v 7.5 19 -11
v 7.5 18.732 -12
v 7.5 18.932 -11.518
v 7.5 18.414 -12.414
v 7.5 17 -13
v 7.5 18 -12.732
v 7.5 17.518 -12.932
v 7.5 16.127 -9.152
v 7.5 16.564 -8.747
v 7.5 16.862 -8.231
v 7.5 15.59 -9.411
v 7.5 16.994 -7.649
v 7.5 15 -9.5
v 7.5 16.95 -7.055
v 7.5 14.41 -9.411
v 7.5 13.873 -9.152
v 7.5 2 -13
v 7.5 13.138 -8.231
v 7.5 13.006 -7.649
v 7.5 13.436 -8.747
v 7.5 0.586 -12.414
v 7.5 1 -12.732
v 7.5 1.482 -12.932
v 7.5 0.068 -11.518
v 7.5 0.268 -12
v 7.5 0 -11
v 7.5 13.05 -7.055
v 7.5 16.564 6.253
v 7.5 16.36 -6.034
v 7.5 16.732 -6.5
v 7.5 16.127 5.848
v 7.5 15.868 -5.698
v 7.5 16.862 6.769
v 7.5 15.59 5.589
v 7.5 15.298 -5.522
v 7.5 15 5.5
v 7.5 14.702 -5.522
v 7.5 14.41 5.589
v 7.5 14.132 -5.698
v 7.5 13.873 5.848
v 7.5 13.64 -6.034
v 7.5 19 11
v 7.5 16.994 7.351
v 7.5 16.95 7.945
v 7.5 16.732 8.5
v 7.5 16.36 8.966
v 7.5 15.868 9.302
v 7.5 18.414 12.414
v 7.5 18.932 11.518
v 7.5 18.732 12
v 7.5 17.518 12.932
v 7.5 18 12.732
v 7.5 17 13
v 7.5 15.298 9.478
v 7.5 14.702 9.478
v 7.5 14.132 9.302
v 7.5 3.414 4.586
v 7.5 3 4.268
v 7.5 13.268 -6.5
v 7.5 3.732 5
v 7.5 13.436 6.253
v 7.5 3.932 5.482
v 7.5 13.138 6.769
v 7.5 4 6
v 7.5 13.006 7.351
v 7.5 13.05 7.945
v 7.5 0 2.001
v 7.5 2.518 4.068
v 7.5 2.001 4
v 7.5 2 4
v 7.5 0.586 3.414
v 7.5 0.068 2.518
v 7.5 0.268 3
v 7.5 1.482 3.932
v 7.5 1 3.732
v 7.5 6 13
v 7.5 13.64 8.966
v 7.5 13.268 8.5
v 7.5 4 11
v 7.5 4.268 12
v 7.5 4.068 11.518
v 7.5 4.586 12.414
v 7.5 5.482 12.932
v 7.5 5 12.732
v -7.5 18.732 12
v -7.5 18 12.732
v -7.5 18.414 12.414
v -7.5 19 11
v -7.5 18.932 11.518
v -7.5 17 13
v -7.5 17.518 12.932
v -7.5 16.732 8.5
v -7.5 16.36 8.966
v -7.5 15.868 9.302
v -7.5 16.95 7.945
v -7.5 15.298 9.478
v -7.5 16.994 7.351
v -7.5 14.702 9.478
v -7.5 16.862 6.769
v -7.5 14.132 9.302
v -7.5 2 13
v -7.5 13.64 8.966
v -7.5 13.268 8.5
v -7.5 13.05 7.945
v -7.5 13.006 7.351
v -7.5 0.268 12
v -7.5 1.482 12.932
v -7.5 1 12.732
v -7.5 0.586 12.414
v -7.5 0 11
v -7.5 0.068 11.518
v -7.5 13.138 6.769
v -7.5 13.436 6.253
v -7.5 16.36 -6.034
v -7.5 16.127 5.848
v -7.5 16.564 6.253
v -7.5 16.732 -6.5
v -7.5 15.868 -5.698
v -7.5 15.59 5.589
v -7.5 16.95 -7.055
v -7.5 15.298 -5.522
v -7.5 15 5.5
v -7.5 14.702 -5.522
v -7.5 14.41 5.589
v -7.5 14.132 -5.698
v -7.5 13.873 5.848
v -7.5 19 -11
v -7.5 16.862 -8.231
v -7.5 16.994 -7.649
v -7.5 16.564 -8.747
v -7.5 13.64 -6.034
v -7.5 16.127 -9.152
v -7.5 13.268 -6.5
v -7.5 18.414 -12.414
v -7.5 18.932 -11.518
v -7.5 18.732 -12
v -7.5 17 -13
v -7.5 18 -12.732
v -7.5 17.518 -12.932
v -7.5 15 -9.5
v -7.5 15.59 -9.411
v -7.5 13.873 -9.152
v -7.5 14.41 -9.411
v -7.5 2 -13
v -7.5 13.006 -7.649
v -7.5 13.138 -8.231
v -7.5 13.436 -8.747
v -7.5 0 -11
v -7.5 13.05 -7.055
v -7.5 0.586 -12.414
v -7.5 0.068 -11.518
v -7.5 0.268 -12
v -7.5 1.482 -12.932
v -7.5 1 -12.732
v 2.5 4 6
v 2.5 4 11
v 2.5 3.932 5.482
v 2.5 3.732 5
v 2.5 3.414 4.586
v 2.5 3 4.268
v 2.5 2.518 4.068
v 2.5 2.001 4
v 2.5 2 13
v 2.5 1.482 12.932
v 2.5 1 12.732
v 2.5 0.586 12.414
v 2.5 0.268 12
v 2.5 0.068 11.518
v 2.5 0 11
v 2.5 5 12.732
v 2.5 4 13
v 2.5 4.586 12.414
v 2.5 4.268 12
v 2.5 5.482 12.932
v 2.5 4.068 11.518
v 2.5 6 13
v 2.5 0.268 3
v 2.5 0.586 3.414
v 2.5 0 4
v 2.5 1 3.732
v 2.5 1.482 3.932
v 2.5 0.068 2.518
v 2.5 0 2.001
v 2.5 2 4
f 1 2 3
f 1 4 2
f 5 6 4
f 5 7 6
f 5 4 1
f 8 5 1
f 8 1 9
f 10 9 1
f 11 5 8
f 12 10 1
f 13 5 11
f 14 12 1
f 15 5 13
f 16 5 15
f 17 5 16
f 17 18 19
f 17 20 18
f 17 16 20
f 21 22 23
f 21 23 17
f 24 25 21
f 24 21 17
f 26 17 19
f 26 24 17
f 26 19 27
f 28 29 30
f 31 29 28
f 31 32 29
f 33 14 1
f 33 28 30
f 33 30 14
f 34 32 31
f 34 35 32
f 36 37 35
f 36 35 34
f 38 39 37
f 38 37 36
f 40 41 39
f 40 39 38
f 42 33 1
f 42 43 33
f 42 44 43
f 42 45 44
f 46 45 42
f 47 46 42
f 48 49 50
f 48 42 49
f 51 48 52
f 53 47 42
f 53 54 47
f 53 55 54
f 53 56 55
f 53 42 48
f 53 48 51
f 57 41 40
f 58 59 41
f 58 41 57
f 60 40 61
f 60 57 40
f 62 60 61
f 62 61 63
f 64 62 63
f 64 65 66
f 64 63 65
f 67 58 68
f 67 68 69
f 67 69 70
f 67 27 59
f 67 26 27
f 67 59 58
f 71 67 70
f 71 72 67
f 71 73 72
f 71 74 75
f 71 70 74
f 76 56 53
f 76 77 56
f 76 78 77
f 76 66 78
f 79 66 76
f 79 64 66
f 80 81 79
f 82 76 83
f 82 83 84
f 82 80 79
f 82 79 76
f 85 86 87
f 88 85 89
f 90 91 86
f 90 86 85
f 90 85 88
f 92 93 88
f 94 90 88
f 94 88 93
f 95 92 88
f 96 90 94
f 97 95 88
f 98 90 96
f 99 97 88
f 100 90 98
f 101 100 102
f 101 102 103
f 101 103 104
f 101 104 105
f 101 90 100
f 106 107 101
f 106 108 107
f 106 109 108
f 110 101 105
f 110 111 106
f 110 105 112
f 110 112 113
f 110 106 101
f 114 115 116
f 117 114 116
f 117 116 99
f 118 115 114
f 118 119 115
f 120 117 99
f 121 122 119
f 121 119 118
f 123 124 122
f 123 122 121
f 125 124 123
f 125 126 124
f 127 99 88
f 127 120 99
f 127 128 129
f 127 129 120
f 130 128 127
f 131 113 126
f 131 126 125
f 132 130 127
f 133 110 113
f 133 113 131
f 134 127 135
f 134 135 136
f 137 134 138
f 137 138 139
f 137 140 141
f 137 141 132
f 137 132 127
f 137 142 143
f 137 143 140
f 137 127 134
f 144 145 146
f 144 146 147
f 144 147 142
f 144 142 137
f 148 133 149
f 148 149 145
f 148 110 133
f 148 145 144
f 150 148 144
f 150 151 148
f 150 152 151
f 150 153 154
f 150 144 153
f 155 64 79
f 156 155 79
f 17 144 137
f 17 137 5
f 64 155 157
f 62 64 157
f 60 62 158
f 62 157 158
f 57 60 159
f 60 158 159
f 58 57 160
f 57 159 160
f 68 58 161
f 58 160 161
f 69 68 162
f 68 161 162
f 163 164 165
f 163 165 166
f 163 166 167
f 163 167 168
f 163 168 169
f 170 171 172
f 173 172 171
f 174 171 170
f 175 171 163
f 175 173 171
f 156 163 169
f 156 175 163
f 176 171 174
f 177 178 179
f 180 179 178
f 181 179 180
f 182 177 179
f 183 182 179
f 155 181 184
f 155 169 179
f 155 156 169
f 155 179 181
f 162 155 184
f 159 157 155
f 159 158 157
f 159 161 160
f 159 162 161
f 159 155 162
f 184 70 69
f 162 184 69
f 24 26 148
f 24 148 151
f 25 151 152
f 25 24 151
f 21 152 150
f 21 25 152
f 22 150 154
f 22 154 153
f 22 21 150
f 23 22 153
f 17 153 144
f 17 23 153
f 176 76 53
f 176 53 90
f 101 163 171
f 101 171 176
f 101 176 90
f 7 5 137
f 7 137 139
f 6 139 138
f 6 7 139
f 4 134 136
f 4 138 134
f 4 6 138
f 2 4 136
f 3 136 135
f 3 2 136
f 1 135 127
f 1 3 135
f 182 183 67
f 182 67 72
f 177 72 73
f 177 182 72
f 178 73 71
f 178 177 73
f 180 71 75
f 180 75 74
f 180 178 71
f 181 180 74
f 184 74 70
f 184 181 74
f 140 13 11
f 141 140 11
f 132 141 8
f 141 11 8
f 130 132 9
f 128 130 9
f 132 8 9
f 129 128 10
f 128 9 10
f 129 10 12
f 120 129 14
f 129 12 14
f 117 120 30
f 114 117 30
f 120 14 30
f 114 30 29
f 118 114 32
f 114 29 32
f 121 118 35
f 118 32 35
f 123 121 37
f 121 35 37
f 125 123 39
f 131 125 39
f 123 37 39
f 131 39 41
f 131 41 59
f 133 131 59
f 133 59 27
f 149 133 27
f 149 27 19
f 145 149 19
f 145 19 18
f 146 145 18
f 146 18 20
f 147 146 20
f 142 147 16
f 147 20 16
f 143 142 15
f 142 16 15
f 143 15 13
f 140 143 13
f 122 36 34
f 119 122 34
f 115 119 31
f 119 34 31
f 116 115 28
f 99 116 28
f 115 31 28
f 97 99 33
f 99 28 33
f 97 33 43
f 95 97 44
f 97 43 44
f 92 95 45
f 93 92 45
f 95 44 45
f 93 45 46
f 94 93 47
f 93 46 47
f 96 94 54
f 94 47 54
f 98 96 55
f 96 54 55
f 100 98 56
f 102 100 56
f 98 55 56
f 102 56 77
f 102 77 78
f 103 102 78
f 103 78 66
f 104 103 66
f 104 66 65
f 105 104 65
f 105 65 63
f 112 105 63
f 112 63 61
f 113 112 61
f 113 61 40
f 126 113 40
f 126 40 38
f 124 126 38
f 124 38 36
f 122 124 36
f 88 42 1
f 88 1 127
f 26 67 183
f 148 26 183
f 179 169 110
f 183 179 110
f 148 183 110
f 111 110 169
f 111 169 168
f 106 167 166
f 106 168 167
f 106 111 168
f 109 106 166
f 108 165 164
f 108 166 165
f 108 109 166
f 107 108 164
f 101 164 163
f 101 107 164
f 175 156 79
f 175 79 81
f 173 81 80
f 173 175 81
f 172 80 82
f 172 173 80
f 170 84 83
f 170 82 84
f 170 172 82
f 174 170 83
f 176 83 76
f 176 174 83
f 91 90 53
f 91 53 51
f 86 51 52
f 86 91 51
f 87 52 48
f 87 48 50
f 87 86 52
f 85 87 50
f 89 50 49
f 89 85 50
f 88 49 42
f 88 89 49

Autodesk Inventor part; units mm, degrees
ref_plane "YZ Plane" through (0, 0, 0) normal (1, 0, 0) x (0, 1, 0)
ref_plane "XZ Plane" through (0, 0, 0) normal (0, 1, 0) x (-1, 0, 0)
ref_plane "XY Plane" through (0, 0, 0) normal (0, 0, 1) x (1, 0, 0)
sketch "Sketch1" plane through (0, 0, 0) normal (0, 1, 0) x (-1, 0, 0)
  line L0 (-7.5, 13) -> (7.5, 13)
  line L1 (7.5, 13) -> (7.5, -13)
  line L2 (7.5, -13) -> (-7.5, -13)
  line L3 (-7.5, -13) -> (-7.5, 13)
  line L4 (-7.5, 13) -> (7.5, -13) construction
  line L5 (7.5, 13) -> (-7.5, -13) construction
  point P0 (0, 0)
  dimension "d0" = 15
  dimension "d1" = 26
extrude "Extrusion1" add sketch "Sketch1" along normal blind 19
sketch "Sketch2" plane through (7.5, 0, 13) normal (1, 0, 0) x (0, 0, -1)
  line L0 (13, -3.8) -> (13, 22.8) projected
  circle A0 centre (5.5, 15) radius 2
  circle A1 centre (20.5, 15) radius 2
  line L1 (0, 0) -> (26, 0) projected
  point P0 (13, 0)
  dimension "d4" = 15
  dimension "d5" = 15
extrude "Extrusion2" cut sketch "Sketch2" against normal through all
sketch "Sketch3" plane through (7.5, 0, 13) normal (1, 0, 0) x (0, 0, -1)
  line L0 (26, 0) -> (0, 0) projected
  line L1 (0, 0) -> (9, 0)
  line L2 (9, 0) -> (9, 4)
  line L3 (9, 4) -> (0, 4)
  line L4 (0, 4) -> (0, 0)
  point P0 (13, 0)
  dimension "d8" = 4
  dimension "d9" = 9
extrude "Extrusion3" cut sketch "Sketch3" against normal blind 5
fillet "Fillet1" radius 2 7 edges at (0, 19, -13) (0, 19, 13) (0, 0, -13) (-2.5, 0, 13) (5, 4, 13) (5, 4, 4) (5, 0, 4)
properties part number "29_Lasercable_holder_A"
